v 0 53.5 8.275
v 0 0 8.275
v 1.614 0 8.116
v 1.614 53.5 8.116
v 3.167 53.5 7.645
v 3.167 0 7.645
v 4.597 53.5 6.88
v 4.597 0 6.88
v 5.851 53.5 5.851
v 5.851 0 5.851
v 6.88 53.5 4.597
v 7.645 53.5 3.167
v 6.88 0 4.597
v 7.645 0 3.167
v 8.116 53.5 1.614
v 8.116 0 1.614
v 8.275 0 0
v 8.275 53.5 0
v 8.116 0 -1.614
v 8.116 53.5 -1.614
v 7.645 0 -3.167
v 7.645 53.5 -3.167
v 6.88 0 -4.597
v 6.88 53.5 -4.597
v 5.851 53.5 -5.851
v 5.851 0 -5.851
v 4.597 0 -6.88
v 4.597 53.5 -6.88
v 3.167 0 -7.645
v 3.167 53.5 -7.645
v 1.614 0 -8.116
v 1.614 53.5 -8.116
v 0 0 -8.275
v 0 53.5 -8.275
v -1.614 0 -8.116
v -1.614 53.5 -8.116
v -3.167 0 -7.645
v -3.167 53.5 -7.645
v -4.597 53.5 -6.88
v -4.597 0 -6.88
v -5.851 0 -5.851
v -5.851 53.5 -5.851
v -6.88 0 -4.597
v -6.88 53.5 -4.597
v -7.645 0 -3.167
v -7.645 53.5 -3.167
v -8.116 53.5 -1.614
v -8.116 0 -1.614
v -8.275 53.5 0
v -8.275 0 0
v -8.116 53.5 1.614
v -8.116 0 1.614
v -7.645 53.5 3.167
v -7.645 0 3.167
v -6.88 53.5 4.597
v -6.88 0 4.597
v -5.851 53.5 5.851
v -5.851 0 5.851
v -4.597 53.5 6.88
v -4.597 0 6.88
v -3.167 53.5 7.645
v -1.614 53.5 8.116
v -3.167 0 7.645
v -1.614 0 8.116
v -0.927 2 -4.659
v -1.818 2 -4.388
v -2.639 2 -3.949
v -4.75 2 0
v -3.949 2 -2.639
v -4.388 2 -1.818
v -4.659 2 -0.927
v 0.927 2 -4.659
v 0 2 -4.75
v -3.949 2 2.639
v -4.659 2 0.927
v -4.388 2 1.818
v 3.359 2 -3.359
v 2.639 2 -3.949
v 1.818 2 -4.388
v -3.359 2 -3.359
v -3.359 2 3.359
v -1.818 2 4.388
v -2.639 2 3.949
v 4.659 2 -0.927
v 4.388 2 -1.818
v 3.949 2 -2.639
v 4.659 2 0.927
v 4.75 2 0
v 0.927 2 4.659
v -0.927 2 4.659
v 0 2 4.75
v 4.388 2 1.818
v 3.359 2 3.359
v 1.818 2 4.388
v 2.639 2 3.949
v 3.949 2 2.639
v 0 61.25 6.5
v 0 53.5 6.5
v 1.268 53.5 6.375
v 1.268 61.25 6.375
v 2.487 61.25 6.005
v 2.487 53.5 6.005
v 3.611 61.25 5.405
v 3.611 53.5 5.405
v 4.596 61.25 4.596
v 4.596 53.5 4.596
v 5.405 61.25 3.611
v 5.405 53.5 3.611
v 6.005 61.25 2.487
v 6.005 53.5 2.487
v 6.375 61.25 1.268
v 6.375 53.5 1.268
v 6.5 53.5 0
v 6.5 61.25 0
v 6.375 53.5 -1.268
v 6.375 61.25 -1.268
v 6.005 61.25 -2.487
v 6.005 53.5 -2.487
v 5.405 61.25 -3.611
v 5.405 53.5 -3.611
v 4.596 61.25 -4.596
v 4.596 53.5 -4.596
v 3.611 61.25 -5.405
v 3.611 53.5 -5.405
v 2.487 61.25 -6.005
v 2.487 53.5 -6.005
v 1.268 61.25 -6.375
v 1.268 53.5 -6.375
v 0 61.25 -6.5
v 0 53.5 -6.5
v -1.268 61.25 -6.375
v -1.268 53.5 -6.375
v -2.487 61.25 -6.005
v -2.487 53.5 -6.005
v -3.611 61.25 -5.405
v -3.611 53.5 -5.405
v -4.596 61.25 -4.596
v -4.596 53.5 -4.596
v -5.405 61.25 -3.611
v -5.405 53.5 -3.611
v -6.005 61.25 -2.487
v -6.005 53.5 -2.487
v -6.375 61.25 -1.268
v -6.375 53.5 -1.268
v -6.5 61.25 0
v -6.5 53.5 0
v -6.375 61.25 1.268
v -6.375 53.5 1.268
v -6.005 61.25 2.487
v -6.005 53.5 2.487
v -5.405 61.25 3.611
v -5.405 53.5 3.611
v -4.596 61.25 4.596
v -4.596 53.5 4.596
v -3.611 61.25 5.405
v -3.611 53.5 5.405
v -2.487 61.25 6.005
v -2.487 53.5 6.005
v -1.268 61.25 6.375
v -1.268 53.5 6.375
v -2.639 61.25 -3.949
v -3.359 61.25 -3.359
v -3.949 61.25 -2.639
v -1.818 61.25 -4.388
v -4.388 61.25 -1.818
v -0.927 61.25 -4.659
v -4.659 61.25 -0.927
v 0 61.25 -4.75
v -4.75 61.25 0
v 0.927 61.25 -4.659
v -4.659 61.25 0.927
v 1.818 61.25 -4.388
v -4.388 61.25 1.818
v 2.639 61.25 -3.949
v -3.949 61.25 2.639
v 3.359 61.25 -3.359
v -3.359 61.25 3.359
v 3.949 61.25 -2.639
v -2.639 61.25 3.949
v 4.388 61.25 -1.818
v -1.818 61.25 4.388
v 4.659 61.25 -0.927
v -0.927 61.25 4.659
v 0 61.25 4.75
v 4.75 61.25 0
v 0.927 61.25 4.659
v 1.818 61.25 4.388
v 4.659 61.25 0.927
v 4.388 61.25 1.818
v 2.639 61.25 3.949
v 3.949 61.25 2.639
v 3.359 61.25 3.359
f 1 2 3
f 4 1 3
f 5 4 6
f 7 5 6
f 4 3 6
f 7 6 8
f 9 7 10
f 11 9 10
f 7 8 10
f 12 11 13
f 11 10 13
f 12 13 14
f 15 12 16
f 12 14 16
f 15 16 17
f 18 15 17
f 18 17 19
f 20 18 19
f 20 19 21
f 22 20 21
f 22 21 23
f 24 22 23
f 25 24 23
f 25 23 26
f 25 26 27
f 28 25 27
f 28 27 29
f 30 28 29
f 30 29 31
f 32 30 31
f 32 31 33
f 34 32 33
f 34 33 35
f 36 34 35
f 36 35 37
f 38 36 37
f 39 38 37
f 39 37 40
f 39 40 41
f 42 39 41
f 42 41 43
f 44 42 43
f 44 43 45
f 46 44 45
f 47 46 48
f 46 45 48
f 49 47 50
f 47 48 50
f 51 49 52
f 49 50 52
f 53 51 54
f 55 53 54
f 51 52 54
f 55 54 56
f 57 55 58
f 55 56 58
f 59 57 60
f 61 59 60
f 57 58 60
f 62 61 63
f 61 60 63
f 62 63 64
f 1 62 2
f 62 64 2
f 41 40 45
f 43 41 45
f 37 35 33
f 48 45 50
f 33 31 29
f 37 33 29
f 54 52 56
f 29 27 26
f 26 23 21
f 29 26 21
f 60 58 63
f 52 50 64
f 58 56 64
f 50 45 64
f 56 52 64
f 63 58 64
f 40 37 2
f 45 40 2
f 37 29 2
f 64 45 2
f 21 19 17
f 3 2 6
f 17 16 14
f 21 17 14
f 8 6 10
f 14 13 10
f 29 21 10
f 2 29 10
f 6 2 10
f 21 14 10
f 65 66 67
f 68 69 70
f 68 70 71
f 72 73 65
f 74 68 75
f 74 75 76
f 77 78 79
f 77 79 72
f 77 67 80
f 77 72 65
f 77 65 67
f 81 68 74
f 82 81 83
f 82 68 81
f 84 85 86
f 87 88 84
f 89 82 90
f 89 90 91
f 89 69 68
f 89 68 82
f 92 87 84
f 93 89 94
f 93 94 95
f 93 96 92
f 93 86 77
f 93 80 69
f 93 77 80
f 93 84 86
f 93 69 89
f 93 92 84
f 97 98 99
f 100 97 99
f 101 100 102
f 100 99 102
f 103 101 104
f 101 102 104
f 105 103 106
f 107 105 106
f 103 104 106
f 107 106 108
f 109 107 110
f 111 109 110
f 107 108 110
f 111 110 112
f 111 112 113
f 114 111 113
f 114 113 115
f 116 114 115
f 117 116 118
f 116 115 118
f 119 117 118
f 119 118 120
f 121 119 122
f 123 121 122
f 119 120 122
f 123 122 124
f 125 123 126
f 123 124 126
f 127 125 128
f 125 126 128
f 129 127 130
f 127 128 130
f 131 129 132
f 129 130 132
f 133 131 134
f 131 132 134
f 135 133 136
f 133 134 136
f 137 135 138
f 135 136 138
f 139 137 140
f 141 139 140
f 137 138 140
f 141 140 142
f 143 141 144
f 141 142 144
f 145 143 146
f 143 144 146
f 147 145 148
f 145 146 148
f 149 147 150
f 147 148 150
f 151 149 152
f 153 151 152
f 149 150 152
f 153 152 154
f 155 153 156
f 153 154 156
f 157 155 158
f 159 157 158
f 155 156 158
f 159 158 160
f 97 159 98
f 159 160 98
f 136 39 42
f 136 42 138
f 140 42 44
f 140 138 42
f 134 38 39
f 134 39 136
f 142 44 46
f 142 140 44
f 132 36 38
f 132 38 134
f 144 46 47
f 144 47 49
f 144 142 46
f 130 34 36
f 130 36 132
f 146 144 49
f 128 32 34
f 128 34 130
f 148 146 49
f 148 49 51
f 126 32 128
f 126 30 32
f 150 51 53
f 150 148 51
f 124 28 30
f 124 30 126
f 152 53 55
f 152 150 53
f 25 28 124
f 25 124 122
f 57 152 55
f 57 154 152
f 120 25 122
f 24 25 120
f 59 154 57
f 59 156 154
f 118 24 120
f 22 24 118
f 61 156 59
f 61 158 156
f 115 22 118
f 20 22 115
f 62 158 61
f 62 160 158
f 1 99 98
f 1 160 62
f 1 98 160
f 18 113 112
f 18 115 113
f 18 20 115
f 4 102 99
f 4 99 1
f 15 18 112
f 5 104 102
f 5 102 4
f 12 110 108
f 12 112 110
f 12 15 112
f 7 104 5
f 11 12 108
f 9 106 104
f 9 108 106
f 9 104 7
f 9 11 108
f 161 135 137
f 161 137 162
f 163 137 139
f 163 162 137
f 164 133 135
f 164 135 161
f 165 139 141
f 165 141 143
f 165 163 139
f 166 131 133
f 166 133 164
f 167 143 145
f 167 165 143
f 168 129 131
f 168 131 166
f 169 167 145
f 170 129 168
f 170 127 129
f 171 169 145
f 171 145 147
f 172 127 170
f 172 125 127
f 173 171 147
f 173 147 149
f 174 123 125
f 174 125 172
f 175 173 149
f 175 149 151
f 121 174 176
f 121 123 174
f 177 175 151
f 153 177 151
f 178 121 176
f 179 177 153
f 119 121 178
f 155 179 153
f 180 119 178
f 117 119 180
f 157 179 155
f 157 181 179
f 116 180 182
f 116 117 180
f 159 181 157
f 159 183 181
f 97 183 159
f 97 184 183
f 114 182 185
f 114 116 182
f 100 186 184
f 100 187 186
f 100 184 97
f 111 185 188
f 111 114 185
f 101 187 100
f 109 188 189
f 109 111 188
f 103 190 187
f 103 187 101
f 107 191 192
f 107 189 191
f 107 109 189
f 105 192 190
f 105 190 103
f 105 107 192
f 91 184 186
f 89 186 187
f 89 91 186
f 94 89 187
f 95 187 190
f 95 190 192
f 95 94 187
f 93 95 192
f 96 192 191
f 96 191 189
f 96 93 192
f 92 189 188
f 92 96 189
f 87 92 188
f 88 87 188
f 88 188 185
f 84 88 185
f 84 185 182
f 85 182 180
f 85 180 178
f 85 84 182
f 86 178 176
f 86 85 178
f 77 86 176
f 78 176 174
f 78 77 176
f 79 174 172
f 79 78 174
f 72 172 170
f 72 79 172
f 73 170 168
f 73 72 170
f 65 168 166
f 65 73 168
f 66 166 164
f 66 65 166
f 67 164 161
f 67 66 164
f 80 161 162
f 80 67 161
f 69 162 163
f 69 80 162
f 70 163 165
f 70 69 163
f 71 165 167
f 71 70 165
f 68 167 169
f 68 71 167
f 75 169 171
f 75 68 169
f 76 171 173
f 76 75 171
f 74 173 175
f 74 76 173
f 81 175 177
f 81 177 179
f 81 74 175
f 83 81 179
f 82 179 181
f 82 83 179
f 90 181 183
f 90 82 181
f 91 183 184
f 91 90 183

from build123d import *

# Parameters (mm, degrees)
SKETCH1_R           = 8.275
BOSS_EXTRUDE1_DEPTH = 61.25
CUT_EXTRUDE1_START  = -7.75
SKETCH2_R           = 8.275
SKETCH2_R_2         = 6.5
SKETCH2_R_3         = 4.75
CUT_EXTRUDE1_DEPTH  = 7.75
CUT_EXTRUDE3_START  = -51.5
SKETCH3_R           = 4.75
CUT_EXTRUDE3_DEPTH  = 51.5


with BuildPart() as part:
    # Sketch1 → Boss-Extrude1 (new body)
    with BuildSketch(Plane(origin=(0, 0, 0), x_dir=(1, 0, 0), z_dir=(0, 1, 0))):
        with Locations(Location((0, 0, 0), (0, 0, 270))):
            Circle(SKETCH1_R)
    extrude(amount=BOSS_EXTRUDE1_DEPTH)

    # Sketch2 → Cut-Extrude1 (cut)
    # profile 1 of 2: a face of its own
    with BuildSketch(Plane(origin=(0, 61.25, 0), x_dir=(1, 0, 0), z_dir=(0, 1, 0)).offset(CUT_EXTRUDE1_START)):
        with Locations(Location((0, 0, 0), (0, 0, 270))):
            Circle(SKETCH2_R)
        with Locations(Location((0, 0, 0), (0, 0, 270))):
            Circle(SKETCH2_R_2, mode=Mode.SUBTRACT)
    # profile 2 of 2: a face of its own
    with BuildSketch(Plane(origin=(0, 61.25, 0), x_dir=(1, 0, 0), z_dir=(0, 1, 0)).offset(CUT_EXTRUDE1_START)):
        with Locations(Location((0, 0, 0), (0, 0, 270))):
            Circle(SKETCH2_R_3)
    extrude(amount=CUT_EXTRUDE1_DEPTH, mode=Mode.SUBTRACT)

    # Sketch3 → Cut-Extrude3 (cut)
    with BuildSketch(Plane(origin=(0, 53.5, 0), x_dir=(1, 0, 0), z_dir=(0, 1, 0)).offset(CUT_EXTRUDE3_START)):
        with Locations(Location((0, 0, 0), (0, 0, 270))):
            Circle(SKETCH3_R)
    extrude(amount=CUT_EXTRUDE3_DEPTH, mode=Mode.SUBTRACT)


solid = part.part
